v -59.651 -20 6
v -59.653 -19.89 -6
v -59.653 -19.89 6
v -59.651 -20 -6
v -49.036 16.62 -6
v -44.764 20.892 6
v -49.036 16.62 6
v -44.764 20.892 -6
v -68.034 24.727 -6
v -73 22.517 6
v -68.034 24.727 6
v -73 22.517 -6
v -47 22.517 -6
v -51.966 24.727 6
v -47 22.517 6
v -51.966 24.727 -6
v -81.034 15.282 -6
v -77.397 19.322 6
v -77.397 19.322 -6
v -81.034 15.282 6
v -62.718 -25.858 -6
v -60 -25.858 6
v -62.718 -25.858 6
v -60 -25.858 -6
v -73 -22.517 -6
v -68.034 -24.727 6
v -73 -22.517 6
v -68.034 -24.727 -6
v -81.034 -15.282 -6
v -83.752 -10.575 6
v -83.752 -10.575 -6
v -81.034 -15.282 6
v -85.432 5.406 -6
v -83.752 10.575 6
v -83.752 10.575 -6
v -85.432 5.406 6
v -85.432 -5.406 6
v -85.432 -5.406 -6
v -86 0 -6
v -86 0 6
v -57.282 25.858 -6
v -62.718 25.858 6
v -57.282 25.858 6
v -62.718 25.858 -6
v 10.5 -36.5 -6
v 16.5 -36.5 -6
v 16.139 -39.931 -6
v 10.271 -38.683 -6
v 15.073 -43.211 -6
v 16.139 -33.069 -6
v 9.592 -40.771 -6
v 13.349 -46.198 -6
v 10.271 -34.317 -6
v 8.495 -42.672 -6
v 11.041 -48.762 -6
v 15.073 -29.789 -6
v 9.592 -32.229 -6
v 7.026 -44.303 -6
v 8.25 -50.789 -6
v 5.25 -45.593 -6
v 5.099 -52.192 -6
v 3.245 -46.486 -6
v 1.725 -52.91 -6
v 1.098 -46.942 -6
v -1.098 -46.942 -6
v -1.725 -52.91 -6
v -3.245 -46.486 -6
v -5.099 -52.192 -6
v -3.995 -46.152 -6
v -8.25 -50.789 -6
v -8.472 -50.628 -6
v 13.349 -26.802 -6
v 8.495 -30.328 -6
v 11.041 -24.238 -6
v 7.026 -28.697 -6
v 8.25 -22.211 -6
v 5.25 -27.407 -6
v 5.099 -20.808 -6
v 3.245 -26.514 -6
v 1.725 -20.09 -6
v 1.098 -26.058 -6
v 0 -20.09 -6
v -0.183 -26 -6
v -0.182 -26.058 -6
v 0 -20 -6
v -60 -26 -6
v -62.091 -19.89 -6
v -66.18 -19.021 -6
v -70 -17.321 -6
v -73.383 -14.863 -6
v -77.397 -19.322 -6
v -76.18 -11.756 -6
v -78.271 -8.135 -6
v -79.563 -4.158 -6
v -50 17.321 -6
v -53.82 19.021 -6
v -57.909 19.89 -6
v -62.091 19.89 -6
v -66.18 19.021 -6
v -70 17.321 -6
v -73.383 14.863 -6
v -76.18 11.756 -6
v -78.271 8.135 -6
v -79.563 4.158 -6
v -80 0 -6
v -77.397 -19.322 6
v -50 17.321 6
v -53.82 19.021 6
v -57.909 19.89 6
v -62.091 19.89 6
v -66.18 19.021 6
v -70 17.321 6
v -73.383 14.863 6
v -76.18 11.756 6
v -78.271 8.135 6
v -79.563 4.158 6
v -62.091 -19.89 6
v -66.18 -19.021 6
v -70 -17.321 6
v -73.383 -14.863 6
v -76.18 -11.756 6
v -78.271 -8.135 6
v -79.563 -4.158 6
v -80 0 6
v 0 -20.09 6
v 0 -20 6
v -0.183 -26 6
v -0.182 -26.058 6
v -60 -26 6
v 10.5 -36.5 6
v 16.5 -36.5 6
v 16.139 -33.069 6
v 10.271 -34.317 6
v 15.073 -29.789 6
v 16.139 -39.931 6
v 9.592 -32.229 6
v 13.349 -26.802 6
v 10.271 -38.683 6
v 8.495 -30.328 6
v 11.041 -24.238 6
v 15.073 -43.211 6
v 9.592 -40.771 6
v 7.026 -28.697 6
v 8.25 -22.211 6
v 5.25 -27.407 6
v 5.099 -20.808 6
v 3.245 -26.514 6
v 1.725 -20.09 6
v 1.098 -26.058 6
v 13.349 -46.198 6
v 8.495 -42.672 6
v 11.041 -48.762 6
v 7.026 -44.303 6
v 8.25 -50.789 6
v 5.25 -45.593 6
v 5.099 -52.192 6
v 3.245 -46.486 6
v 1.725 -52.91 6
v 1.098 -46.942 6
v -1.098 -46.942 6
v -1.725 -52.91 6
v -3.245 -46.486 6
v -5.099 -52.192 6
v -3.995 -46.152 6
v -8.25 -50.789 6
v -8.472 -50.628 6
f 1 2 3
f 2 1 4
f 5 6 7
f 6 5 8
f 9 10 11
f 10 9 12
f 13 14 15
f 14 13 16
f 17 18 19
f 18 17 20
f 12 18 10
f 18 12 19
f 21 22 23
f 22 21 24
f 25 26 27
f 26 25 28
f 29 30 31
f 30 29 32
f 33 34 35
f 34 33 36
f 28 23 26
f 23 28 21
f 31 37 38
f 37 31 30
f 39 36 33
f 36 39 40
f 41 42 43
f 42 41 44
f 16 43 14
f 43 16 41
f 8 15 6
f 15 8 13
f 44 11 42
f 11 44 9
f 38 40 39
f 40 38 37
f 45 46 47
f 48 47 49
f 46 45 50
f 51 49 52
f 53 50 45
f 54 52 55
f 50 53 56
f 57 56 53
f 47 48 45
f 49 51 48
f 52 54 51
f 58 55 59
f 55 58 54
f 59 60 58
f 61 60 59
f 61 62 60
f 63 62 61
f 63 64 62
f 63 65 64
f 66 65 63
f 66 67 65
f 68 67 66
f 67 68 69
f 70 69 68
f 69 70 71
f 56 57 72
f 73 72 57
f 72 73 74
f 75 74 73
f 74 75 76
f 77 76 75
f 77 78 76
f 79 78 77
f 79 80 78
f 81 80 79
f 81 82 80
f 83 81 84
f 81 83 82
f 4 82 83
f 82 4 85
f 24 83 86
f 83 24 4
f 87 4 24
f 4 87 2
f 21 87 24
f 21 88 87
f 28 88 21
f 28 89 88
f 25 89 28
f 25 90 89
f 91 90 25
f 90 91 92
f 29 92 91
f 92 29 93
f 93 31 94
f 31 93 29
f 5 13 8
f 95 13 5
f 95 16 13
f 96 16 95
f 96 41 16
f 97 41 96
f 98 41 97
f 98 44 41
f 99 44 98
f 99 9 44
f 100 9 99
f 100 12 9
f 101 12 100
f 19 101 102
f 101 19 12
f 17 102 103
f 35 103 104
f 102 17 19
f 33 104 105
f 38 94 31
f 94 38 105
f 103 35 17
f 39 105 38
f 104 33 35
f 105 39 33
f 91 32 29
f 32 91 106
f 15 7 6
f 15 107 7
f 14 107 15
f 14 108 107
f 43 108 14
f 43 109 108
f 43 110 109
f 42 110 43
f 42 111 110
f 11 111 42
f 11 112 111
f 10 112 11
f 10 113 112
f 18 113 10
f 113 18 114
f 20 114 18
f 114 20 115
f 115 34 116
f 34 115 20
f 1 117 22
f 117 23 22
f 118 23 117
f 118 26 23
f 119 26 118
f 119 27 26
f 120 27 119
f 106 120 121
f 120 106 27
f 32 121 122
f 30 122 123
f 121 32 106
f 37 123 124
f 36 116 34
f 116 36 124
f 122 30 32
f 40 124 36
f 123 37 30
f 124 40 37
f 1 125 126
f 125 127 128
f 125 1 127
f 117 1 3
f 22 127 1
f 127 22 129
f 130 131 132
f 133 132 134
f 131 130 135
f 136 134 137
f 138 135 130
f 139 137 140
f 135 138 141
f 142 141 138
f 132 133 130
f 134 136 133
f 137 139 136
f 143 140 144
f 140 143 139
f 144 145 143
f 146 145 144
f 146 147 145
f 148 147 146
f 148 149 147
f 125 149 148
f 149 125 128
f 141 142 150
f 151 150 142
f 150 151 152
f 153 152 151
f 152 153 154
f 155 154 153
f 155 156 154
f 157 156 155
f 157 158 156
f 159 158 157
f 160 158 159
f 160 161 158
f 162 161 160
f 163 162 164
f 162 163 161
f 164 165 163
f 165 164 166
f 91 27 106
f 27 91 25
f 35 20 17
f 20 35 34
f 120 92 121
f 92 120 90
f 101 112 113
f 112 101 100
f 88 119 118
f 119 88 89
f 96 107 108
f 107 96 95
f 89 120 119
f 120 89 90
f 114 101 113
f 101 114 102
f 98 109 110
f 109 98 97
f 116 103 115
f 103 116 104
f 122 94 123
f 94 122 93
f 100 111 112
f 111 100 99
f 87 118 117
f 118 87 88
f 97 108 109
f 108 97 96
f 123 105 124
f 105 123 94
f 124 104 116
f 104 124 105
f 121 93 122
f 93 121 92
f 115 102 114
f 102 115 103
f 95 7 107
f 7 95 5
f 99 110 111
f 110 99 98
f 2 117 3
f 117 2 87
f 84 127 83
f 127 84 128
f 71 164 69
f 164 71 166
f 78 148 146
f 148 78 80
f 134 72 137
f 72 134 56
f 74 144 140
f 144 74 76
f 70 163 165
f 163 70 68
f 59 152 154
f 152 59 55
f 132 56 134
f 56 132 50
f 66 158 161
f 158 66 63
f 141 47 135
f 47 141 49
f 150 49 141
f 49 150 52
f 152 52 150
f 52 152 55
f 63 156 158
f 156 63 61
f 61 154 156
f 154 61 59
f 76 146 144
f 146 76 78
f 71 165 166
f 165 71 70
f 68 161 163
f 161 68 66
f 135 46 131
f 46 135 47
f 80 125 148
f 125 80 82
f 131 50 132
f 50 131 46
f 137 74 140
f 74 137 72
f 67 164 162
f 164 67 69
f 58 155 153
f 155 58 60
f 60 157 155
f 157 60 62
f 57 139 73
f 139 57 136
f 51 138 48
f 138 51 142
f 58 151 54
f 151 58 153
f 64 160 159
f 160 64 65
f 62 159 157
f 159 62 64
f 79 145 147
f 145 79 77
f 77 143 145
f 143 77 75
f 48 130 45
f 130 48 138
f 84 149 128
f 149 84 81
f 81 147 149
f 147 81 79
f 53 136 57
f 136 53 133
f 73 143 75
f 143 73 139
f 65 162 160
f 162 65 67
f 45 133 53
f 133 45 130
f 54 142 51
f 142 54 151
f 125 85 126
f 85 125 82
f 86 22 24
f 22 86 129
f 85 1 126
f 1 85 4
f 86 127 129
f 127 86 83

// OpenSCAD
//////////////////////////////////////////////
// Start of User Configurable Parameters
//////////////////////////////////////////////

/**
top_hook_radius: [Mili Meters] This is the inner radius of the top S Hook
**/
top_hook_radius = 20;

/**
bottom_hook_radius: [Mili Meters] This is the inner radius of the bottom S Hook
**/
bottom_hook_radius = 10.5;

/**
width: [mili meters] This is the width of the S Hook body (in Y direction)
**/
width = 6.0;

/**
thickness: [Milli Meters] This is the thickness of the S Hook (in Z direction)
**/
// The thickness of the piece
thickness = 12.0;

/**
length: [mili meters] This is the length of the joiner between hook ends (in X direction)
**/
length = 60.0;

/**
start_angle: [DEGREES] This adjusts where the opening in the S Hook starts
**/
start_angle = 45;

/**
end_angle: [DEGREES] This adjusts where the opening of the S Hook ends.
	Normally end_angle will be ~-90 degrees. This is so the transition from top to bottom hook
	is smooth. If you want the opening to be somewhere else than adjust this value.
**/
end_angle = -89; // 


//////////////////////////////////////////////
// End of User Configurable Parameters
//////////////////////////////////////////////

/**
The union formed in this method is used to cut the hook opening in the circle
**/
module cutOpening(start, end, radius) {
	union() {
		for(angle=[start:end]) {
			//echo("remove angle: ", angle);
			rotate([0,0,angle]) {
				translate([0,0,-thickness/2-0.01]) {
					cube([radius,4,thickness+0.04]);
				}
			}
		}
	}
}

/**
This method forms one half of the S Hook
**/
module hook(hookWidth, hookThickness, hookInnerRadius) {
	radius = hookInnerRadius + hookWidth; 
	
	start = floor(start_angle);
	end = floor(end_angle);
	
	openingStart = min(start, end);
	openingEnd = max(start, end);
	
	echo("Opening Start Angle=", openingStart, " openingEnd= ", openingEnd);
	
	difference() {
		cylinder( h = thickness, r = radius, center = true);	
    	cylinder( h = thickness, r = hookInnerRadius, center = true);
		
		cutOpening(start, end, radius);
	}
}

union() {
	translate(v = [-length,0,0]) {
    	hook(width, thickness, top_hook_radius);
	}
	translate(v = [-length/2,-1*(top_hook_radius+(width/2)),0]) {
		cube([length,width,thickness],true);
	}
	
    translate(v = [0,-1*(top_hook_radius+(width)+bottom_hook_radius),0]) {
        rotate([0, 0, 180]) {
	    	hook(width, thickness, bottom_hook_radius);
		}
    }
}
